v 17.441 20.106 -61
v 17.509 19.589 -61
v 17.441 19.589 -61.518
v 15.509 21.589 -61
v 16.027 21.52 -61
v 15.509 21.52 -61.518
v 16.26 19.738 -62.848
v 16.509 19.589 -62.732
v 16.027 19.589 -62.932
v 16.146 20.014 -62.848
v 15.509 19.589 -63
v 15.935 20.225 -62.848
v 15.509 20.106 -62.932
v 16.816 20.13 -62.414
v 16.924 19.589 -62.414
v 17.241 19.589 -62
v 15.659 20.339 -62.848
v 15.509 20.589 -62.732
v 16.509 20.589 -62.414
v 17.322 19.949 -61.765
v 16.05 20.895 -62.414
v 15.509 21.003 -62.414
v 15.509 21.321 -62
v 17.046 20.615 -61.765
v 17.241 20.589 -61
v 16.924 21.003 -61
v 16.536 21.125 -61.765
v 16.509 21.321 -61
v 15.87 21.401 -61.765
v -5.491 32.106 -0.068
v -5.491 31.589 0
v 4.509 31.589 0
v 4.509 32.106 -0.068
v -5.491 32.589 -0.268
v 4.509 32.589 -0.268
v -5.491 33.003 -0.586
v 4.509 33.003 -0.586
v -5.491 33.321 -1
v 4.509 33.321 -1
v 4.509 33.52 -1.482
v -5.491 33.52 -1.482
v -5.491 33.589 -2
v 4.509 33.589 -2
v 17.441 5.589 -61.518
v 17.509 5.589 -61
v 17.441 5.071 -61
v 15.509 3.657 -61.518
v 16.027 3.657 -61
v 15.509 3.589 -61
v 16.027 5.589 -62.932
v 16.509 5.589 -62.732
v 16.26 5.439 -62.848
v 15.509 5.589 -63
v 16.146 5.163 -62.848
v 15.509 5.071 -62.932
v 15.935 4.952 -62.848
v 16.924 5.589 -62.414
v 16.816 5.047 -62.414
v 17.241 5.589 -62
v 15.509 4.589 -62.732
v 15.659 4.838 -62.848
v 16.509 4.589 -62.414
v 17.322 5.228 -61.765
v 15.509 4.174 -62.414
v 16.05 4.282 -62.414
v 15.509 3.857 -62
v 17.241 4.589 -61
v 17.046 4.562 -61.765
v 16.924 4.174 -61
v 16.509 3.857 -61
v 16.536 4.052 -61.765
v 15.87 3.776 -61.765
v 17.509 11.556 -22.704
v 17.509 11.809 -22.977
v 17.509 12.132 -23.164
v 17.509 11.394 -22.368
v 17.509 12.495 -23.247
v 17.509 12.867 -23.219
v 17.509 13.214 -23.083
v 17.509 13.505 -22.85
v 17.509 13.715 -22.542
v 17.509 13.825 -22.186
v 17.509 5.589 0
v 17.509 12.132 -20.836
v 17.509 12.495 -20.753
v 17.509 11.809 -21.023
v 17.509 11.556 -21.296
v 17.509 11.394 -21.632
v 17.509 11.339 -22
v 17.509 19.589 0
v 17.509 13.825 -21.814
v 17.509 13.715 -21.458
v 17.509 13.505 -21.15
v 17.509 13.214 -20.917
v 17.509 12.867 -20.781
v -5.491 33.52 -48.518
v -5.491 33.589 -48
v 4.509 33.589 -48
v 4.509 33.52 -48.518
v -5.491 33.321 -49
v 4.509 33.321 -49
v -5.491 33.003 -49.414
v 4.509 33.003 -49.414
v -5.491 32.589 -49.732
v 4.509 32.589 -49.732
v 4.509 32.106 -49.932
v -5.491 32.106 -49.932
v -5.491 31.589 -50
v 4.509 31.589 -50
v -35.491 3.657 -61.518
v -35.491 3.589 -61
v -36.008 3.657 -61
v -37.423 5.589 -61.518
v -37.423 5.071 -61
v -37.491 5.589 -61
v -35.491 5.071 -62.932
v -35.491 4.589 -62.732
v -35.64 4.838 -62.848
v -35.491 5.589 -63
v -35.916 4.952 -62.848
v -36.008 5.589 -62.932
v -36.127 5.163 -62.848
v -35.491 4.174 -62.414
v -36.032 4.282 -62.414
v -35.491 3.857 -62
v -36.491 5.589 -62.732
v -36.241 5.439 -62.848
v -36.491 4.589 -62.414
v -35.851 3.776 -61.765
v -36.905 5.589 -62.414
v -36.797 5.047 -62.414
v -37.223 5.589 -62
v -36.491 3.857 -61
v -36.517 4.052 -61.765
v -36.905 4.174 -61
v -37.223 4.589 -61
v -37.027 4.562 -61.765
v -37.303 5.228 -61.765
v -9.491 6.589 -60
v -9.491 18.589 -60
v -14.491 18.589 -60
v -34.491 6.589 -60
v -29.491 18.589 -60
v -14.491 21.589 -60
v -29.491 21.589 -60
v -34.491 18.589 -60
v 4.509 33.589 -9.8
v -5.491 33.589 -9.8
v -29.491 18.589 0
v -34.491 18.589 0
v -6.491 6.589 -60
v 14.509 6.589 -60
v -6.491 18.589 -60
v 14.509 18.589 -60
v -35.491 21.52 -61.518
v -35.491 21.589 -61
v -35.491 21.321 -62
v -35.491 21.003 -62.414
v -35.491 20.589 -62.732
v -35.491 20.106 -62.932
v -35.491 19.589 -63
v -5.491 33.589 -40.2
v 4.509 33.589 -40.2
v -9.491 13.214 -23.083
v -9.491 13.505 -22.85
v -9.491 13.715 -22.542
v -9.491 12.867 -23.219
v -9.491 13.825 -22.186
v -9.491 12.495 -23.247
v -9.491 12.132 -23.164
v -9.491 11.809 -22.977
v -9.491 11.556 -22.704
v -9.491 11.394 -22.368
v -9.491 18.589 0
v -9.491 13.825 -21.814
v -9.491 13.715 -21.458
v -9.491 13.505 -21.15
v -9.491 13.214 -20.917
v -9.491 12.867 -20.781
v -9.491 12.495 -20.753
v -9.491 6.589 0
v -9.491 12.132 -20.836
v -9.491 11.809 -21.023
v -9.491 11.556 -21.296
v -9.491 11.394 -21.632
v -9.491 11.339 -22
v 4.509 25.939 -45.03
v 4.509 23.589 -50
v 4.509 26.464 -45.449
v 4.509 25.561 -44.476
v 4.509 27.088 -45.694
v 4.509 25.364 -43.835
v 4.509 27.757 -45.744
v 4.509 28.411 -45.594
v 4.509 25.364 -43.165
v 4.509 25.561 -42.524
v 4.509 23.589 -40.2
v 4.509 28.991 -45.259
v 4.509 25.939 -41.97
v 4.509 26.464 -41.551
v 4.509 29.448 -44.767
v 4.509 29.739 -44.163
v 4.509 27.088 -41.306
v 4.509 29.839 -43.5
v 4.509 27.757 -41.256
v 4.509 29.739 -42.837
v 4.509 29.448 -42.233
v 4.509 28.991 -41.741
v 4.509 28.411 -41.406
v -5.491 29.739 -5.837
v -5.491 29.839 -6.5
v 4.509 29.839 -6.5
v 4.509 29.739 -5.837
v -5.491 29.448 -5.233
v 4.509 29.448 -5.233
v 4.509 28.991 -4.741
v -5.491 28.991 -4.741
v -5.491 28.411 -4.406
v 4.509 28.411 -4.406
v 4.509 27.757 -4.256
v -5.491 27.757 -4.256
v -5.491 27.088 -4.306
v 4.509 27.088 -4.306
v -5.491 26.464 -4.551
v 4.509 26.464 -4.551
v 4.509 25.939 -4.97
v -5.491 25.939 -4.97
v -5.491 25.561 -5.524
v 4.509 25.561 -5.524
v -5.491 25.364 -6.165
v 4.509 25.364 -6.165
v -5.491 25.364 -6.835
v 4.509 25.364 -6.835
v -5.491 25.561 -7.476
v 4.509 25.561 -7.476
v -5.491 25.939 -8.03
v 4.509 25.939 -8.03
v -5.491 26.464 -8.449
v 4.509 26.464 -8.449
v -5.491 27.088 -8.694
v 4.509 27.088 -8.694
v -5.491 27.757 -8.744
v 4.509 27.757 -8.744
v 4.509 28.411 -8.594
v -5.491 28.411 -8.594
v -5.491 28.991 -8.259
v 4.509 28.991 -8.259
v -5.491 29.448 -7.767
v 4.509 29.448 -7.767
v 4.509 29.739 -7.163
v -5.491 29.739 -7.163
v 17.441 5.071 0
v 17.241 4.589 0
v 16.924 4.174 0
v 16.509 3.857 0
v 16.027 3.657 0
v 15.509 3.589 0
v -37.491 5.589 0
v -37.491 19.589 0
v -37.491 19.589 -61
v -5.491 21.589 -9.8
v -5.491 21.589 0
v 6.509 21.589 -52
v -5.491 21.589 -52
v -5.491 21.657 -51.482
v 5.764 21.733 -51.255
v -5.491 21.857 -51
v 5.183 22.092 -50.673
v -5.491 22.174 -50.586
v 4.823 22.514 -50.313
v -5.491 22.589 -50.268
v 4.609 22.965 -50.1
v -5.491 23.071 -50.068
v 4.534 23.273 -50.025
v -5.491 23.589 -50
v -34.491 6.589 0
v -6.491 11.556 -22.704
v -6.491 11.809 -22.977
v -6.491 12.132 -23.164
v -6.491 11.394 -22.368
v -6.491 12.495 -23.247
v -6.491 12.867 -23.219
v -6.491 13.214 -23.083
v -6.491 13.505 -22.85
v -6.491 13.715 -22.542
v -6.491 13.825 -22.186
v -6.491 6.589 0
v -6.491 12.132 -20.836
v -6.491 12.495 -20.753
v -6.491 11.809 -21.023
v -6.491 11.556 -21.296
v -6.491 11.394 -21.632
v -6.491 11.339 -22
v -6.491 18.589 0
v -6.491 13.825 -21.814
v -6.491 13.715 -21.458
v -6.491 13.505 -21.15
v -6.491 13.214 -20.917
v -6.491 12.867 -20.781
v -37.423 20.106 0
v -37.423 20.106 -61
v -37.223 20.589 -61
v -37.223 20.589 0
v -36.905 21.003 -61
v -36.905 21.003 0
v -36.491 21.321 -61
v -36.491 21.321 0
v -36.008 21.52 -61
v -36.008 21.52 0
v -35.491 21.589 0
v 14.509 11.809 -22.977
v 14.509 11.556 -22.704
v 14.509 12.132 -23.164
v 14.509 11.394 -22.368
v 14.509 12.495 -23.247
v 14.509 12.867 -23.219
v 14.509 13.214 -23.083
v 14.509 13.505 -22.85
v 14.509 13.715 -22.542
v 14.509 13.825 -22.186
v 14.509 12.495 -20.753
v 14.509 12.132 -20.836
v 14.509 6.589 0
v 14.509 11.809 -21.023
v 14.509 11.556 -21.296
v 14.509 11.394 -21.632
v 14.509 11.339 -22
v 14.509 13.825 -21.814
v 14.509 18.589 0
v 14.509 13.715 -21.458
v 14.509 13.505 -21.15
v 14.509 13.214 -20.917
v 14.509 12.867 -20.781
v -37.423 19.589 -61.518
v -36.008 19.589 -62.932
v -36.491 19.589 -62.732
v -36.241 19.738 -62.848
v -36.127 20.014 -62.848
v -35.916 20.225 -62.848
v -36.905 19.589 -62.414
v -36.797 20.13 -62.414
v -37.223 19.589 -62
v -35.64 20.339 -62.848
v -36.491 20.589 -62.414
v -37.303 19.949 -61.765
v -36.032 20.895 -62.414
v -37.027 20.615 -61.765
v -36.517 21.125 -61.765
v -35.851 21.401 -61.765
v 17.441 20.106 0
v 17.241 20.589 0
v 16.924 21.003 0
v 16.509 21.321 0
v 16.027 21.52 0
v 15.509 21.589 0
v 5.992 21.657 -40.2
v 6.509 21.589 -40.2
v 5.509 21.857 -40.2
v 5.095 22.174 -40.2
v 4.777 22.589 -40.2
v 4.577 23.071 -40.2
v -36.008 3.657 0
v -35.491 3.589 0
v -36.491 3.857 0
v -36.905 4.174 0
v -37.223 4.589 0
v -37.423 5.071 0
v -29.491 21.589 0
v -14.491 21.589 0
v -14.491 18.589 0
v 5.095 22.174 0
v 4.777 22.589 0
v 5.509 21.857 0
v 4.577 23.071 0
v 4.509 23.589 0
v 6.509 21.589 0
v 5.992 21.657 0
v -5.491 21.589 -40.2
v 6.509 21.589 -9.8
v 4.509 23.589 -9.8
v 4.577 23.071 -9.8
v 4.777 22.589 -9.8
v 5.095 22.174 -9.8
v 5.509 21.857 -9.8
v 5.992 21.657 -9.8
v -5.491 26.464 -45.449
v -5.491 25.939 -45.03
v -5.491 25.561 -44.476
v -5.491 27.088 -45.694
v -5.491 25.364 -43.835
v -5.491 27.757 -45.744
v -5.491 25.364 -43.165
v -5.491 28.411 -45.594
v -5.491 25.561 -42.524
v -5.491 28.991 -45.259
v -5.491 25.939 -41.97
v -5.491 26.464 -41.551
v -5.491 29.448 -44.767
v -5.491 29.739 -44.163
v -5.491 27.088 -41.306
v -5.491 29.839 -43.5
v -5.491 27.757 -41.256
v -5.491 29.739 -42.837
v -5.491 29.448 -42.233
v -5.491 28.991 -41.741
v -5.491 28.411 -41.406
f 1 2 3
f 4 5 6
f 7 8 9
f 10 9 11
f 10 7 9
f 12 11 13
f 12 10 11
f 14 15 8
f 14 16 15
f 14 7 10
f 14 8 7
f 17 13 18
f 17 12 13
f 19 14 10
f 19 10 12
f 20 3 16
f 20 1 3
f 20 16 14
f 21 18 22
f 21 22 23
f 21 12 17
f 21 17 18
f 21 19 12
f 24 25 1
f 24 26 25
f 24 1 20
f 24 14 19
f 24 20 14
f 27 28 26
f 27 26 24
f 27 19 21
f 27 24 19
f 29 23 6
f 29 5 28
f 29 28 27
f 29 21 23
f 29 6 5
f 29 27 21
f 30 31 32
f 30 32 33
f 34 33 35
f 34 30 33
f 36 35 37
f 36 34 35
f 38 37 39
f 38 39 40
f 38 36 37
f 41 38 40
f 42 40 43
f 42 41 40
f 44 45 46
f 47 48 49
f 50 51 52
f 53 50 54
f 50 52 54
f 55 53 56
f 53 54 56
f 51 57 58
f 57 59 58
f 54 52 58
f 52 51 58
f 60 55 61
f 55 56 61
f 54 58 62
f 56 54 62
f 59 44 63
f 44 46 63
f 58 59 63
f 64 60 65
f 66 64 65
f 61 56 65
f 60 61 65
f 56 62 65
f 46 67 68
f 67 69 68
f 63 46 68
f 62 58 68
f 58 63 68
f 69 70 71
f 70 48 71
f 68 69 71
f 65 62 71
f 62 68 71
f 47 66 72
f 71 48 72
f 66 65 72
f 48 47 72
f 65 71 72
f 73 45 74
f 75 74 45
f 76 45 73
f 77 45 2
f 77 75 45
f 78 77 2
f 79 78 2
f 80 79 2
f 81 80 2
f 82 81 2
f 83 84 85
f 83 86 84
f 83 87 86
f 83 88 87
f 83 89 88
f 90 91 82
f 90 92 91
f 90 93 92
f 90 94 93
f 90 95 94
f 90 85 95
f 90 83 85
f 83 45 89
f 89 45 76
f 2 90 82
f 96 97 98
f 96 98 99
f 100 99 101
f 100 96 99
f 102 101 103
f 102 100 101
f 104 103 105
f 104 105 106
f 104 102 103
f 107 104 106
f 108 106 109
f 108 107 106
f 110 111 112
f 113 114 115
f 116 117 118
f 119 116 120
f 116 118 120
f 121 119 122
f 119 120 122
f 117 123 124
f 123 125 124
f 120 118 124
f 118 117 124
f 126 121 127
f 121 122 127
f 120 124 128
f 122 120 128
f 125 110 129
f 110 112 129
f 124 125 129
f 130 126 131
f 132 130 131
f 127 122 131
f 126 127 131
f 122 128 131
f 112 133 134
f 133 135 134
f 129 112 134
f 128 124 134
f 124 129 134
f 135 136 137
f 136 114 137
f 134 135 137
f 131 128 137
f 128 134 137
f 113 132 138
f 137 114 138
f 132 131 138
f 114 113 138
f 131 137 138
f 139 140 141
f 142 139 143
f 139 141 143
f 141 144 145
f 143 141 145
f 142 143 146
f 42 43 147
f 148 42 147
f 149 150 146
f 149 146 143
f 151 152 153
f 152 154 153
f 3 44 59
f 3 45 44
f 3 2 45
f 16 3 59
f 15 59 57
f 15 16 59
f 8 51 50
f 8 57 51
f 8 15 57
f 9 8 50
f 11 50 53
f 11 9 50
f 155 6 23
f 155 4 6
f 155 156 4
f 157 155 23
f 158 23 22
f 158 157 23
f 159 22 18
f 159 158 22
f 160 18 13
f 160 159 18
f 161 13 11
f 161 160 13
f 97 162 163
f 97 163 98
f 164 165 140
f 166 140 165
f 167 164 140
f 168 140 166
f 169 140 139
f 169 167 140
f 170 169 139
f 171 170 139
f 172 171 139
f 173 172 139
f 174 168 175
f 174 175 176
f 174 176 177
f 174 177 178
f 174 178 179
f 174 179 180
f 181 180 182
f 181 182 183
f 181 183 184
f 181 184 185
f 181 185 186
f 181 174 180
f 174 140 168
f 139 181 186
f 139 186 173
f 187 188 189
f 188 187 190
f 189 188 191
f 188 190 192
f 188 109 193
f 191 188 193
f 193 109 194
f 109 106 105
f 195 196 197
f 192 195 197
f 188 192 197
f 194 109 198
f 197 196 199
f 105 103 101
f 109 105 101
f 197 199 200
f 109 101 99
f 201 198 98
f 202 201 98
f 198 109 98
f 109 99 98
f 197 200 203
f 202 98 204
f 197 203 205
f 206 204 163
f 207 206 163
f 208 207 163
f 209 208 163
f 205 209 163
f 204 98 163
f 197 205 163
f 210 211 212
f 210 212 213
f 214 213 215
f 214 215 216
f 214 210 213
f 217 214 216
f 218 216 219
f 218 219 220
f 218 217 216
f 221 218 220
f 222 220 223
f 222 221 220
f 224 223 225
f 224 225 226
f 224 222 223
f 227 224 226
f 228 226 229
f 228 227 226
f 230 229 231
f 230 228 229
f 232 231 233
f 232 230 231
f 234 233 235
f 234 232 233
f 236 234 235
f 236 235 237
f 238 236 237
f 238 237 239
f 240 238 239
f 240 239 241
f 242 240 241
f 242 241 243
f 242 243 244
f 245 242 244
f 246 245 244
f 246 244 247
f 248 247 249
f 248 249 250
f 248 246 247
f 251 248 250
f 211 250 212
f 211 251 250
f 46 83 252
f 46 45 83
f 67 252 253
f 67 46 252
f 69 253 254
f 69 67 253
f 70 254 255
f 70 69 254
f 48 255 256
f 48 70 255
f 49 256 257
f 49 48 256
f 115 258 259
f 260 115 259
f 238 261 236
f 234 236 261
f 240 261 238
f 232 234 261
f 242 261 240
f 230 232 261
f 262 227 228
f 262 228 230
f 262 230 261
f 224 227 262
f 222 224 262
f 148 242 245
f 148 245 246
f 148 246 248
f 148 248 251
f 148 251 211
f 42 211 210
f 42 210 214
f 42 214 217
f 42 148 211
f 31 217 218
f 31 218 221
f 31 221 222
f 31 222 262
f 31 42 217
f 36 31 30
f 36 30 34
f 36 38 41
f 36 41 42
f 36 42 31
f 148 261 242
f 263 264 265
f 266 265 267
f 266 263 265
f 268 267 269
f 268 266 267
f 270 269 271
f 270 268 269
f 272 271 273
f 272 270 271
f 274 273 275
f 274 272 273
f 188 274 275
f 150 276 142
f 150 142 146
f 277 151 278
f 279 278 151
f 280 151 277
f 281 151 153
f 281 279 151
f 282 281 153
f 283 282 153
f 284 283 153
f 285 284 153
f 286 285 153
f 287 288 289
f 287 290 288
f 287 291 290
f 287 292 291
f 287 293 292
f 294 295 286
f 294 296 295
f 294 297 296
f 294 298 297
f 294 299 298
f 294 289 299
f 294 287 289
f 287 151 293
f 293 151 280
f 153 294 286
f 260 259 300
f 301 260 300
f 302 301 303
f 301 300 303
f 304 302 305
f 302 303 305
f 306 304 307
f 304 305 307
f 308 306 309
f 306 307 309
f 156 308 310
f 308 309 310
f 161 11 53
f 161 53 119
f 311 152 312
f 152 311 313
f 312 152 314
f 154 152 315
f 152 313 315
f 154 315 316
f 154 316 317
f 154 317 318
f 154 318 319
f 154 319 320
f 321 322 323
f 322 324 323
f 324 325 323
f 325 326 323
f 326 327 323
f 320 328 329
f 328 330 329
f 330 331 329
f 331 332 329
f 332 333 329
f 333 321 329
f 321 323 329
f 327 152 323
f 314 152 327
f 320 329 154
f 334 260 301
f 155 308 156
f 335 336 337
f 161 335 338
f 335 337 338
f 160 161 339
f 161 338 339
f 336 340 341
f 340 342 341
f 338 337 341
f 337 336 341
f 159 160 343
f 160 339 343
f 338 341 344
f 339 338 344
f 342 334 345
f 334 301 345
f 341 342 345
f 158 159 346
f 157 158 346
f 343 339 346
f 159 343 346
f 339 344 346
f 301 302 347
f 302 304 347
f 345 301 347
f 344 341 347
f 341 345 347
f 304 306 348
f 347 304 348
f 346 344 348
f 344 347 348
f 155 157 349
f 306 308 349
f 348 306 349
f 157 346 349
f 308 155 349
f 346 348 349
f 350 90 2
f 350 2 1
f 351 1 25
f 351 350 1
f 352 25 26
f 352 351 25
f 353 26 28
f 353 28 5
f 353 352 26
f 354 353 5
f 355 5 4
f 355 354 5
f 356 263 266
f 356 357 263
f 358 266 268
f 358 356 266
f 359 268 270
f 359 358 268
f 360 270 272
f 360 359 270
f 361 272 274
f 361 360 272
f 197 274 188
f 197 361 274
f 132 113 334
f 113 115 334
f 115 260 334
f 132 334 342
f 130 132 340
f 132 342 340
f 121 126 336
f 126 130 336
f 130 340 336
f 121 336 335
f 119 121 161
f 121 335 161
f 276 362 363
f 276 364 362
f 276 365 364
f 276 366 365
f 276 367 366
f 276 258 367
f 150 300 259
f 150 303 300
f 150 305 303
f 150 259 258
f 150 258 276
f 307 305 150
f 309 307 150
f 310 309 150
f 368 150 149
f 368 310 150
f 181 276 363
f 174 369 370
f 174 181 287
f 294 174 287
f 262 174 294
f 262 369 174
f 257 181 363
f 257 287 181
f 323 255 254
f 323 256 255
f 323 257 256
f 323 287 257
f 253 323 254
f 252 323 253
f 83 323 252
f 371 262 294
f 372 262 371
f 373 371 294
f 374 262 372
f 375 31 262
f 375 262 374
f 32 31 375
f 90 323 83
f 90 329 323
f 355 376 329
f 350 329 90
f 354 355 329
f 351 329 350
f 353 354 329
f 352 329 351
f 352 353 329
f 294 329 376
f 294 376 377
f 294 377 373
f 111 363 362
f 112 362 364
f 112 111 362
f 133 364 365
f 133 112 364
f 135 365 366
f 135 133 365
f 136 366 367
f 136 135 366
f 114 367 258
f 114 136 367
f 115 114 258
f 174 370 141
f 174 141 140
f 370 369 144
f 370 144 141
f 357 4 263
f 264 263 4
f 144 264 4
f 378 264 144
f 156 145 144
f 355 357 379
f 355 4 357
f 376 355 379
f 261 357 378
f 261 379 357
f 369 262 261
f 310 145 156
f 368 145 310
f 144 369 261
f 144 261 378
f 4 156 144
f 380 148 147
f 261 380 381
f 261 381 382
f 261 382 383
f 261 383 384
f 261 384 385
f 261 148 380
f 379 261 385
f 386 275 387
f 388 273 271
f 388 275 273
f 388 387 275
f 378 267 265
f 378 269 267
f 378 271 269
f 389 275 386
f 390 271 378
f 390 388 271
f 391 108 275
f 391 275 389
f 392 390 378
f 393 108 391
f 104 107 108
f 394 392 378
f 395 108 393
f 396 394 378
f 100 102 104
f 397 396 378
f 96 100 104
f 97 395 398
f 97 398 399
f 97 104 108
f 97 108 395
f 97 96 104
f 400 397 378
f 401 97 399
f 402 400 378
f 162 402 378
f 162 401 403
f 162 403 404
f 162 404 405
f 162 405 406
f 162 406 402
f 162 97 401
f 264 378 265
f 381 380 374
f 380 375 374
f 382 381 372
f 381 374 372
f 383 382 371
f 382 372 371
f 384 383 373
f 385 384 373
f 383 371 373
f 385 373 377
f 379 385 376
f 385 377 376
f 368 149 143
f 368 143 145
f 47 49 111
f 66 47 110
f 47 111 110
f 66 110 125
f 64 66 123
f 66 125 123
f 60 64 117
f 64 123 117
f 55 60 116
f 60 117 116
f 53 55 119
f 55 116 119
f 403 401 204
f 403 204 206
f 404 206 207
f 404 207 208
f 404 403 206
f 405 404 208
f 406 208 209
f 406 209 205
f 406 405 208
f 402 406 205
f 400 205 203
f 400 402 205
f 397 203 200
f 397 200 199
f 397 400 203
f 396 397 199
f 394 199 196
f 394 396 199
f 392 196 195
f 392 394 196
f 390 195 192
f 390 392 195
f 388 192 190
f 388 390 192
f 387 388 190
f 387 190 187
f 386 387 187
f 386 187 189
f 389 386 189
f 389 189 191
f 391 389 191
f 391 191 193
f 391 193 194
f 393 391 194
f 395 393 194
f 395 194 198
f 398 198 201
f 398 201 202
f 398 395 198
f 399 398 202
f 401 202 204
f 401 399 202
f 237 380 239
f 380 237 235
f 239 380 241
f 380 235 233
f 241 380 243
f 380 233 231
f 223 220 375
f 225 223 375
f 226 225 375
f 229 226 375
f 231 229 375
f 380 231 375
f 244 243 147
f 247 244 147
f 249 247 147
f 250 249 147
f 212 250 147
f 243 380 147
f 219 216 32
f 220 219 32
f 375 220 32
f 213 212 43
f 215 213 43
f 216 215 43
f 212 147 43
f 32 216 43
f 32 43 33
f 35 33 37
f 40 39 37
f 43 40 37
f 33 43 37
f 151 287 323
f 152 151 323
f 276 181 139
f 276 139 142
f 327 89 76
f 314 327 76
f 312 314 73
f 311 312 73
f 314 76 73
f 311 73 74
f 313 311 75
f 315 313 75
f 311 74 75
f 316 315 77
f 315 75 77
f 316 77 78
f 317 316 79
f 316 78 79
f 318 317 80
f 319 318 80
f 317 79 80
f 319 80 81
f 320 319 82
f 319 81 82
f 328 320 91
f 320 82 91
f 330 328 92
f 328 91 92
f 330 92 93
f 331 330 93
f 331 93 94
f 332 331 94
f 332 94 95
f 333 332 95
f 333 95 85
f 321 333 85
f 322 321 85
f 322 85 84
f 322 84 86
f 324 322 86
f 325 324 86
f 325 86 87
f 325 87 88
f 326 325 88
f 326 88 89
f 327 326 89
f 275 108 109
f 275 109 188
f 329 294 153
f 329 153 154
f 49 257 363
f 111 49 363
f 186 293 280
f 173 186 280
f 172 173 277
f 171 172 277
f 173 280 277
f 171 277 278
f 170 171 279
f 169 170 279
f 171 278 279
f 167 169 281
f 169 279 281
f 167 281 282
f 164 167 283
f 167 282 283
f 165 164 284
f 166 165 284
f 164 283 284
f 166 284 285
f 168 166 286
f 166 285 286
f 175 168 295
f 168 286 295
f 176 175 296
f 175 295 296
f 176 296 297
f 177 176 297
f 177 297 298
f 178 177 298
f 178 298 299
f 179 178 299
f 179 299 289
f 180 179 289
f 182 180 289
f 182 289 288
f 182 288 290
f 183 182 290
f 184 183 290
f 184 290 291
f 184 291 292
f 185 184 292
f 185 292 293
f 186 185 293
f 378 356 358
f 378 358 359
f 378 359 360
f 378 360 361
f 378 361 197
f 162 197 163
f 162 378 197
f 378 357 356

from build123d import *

# Parameters (mm, degrees)
SKETCH1_W           = 21
SKETCH1_H           = 12
BOSS_EXTRUDE1_DEPTH = 60
SKETCH2_R           = 2.25
BOSS_EXTRUDE2_DEPTH = 10
SKETCH3_W           = 55
SKETCH3_H           = 18
BOSS_EXTRUDE3_DEPTH = 3
FILLET1_R           = 2
SKETCH4_R           = 1.25
CUT_EXTRUDE1_DEPTH  = 30


with BuildPart() as part:
    # Sketch1 → Boss-Extrude1 (new body)
    with BuildSketch(Plane.XY):
        Polygon((17.509291985, 21.588576814), (-9.490708015, 21.588576814), (-14.490708015, 21.588576814), (-14.490708015, 18.588576814), (-9.490708015, 18.588576814), (-9.490708015, 6.588576814), (-34.490708015, 6.588576814), (-34.490708015, 18.588576814), (-29.490708015, 18.588576814), (-29.490708015, 21.588576814), (-34.490708015, 21.588576814), (-37.490708015, 21.588576814), (-37.490708015, 3.588576814), (17.509291985, 3.588576814), align=None)
        with Locations((4.009291985, 12.588576814)):
            Rectangle(SKETCH1_W, SKETCH1_H, mode=Mode.SUBTRACT)
    extrude(amount=-BOSS_EXTRUDE1_DEPTH)

    # Sketch2 → Boss-Extrude2 (add)
    # profile 1 of 2: a face of its own
    with BuildSketch(Plane(origin=(-5.490708015, 0, 0), x_dir=(0, 0, -1), z_dir=(1, 0, 0))):
        with BuildLine():
            Line((50, 21.588576814), (40.2, 21.588576814))
            Line((40.2, 21.588576814), (40.2, 33.588576814))
            Line((40.2, 33.588576814), (48, 33.588576814))
            ThreePointArc((48, 33.588576814), (49.414213562, 33.002790376), (50, 31.588576814))
            Line((50, 31.588576814), (50, 21.588576814))
        make_face()
        with Locations(Location((43.5, 27.588576814, 0), (0, 0, 90))):
            Circle(SKETCH2_R, mode=Mode.SUBTRACT)
    # profile 2 of 2: a face of its own
    with BuildSketch(Plane(origin=(-5.490708015, 0, 0), x_dir=(0, 0, -1), z_dir=(1, 0, 0))):
        with BuildLine():
            Line((9.8, 21.588576814), (0, 21.588576814))
            Line((0, 21.588576814), (0, 31.588576814))
            ThreePointArc((0, 31.588576814), (0.585786438, 33.002790376), (2, 33.588576814))
            Line((2, 33.588576814), (9.8, 33.588576814))
            Line((9.8, 33.588576814), (9.8, 21.588576814))
        make_face()
        with Locations(Location((6.5, 27.588576814, 0), (0, 0, 90))):
            Circle(SKETCH2_R, mode=Mode.SUBTRACT)
    extrude(amount=BOSS_EXTRUDE2_DEPTH)

    # Sketch3 → Boss-Extrude3 (add)
    with BuildSketch(Plane(origin=(0, 0, -60), x_dir=(-1, 0, 0), z_dir=(0, 0, -1))):
        with Locations((9.990708015, 12.588576814)):
            Rectangle(SKETCH3_W, SKETCH3_H)
    extrude(amount=BOSS_EXTRUDE3_DEPTH)

    # Fillet1
    fillet1_edges = [part.edges().sort_by_distance(p)[0] for p in [
        (17.509291985, 3.588576814, -31.5),
        (-37.490708015, 3.588576814, -31.5),
        (-37.490708015, 21.588576814, -31.5),
        (17.509291985, 21.588576814, -31.5),
        (4.509291985, 21.588576814, -45.1),
        (-0.490708015, 21.588576814, -50),
        (4.509291985, 21.588576814, -4.9),
        (17.509291985, 12.588576814, -63),
        (-9.990708015, 3.588576814, -63),
        (-37.490708015, 12.588576814, -63),
        (-9.990708015, 21.588576814, -63),
    ]]
    fillet(fillet1_edges, radius=FILLET1_R)

    # Sketch4 → Cut-Extrude1 (cut)
    with BuildSketch(Plane(origin=(17.509291985, 0, 0), x_dir=(0, 0, -1), z_dir=(1, 0, 0))):
        with Locations(Location((22, 12.588576814, 0), (0, 0, 270))):
            Circle(SKETCH4_R)
    extrude(amount=-CUT_EXTRUDE1_DEPTH, mode=Mode.SUBTRACT)


solid = part.part
